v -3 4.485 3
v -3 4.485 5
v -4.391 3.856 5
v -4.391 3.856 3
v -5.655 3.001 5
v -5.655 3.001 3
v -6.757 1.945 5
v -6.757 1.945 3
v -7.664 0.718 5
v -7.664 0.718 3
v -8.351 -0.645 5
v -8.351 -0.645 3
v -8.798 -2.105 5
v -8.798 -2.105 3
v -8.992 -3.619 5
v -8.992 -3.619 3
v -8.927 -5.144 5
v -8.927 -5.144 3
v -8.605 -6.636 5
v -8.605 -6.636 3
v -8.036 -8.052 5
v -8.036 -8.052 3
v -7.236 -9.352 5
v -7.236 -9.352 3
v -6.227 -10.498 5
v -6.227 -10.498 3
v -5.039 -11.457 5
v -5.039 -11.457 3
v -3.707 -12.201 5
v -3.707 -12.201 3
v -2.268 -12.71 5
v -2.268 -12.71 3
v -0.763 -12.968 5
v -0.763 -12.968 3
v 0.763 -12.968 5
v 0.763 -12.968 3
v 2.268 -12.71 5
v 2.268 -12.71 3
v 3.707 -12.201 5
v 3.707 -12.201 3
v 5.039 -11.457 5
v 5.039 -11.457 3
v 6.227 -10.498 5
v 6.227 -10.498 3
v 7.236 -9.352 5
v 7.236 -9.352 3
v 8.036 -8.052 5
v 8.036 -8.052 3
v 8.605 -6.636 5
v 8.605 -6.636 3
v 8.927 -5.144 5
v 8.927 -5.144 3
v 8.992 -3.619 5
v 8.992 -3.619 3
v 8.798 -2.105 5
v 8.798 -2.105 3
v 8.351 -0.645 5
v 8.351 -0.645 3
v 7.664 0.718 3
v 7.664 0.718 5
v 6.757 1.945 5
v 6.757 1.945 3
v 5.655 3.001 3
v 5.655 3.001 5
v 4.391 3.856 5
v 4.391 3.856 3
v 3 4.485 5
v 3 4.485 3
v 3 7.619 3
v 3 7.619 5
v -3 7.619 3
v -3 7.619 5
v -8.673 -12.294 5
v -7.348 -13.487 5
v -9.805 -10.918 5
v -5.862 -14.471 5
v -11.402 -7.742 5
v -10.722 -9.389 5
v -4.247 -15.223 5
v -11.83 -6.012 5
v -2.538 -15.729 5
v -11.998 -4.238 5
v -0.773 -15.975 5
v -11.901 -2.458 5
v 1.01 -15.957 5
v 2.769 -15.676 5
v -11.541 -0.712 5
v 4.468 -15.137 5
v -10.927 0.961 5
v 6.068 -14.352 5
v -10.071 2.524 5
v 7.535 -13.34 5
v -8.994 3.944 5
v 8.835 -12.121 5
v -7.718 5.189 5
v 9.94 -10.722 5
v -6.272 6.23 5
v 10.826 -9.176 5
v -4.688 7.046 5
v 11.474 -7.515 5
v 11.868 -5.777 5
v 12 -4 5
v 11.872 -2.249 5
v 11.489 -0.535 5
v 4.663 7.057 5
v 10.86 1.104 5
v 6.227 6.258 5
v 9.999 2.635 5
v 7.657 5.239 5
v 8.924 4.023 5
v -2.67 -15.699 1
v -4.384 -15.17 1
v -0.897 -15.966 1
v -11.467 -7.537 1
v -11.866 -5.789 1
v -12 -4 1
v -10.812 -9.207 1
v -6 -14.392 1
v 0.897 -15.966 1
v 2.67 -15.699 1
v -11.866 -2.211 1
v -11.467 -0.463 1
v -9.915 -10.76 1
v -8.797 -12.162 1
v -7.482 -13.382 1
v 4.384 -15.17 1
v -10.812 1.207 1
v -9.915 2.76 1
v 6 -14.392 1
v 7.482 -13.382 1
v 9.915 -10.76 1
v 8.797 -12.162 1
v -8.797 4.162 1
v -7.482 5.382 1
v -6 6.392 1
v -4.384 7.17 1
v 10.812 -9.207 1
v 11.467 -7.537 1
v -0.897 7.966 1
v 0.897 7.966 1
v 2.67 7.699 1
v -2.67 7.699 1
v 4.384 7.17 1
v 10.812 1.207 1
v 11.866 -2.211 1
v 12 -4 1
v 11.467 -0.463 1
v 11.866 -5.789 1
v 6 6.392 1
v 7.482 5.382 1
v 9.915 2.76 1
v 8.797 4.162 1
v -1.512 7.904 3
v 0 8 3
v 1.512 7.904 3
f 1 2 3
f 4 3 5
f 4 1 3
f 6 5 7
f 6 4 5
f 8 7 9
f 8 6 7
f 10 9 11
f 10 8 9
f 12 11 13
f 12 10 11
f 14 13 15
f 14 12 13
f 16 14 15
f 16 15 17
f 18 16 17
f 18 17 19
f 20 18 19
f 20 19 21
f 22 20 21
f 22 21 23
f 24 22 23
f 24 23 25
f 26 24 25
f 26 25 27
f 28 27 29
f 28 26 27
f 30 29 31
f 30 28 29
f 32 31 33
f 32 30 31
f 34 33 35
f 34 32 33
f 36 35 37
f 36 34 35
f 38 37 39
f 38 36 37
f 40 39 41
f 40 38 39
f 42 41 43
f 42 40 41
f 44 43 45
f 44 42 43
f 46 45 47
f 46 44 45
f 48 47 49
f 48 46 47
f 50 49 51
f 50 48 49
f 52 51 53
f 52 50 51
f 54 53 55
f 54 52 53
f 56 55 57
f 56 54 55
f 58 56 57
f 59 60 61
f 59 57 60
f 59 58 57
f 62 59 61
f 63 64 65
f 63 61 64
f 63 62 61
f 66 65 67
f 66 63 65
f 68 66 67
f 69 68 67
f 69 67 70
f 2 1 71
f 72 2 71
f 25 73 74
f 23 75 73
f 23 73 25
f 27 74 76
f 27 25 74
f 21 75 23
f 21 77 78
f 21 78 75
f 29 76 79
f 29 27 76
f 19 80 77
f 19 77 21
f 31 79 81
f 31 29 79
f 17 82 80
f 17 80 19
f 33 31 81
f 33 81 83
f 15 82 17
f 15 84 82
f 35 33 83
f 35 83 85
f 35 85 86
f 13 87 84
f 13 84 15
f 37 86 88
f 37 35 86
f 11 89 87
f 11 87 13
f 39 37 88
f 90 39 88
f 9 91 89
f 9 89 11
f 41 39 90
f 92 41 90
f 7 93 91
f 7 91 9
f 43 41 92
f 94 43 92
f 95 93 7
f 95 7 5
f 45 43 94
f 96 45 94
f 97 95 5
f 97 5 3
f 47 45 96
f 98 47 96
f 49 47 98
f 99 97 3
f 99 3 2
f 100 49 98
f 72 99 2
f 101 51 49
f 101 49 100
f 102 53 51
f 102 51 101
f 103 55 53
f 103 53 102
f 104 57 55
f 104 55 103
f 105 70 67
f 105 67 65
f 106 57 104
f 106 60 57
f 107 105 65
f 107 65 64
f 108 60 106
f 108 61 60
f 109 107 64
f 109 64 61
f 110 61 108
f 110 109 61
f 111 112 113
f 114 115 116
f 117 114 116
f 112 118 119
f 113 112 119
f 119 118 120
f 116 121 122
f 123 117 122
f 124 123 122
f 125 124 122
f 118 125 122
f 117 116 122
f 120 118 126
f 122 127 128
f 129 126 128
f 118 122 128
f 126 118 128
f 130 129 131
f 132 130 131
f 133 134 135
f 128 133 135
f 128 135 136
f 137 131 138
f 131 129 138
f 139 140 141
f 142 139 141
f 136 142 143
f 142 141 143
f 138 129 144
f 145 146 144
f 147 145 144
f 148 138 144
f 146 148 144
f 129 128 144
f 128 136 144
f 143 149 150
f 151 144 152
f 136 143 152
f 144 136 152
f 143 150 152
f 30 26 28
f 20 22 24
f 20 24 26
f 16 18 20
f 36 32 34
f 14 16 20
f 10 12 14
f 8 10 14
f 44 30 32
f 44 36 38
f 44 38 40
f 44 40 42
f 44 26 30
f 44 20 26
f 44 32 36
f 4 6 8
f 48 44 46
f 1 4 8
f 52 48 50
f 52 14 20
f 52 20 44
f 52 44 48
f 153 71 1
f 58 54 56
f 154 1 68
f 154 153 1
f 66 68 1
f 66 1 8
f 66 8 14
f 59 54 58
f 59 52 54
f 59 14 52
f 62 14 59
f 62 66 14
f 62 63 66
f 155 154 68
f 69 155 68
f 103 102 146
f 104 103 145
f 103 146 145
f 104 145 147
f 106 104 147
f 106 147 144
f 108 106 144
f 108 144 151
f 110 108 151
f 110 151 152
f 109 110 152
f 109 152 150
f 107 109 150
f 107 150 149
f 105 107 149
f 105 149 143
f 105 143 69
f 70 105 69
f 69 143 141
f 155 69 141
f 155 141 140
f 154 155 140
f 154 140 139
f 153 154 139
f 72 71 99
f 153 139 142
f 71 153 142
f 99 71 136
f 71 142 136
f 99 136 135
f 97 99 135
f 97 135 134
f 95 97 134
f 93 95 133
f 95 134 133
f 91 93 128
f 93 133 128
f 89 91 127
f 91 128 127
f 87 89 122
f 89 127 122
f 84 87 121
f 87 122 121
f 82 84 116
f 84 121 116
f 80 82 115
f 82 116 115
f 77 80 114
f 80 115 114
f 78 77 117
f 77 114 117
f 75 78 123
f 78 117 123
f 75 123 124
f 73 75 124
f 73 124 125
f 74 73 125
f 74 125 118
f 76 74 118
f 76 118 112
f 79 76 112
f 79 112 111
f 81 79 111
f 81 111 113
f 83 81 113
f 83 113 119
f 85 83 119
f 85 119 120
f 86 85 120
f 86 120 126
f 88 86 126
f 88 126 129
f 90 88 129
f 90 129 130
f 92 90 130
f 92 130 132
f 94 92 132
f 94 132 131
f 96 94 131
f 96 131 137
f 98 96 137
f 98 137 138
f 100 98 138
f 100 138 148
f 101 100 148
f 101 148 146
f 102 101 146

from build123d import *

# Parameters (mm, degrees)
BOX_W             = 6
BOX_H             = 19
BOX_DEPTH         = 10
CYLINDER001_R     = 9
CYLINDER001_DEPTH = 10
CYLINDER_R        = 12
CYLINDER_DEPTH    = 4


with BuildPart() as cubo:
    # Box → Box (new body)
    with BuildSketch(Plane(origin=(-3, -4, 3), x_dir=(1, 0, 0), z_dir=(0, 0, 1))):
        with Locations((3, 9.5)):
            Rectangle(BOX_W, BOX_H)
    extrude(amount=BOX_DEPTH)


with BuildPart() as circ_int:
    # Cylinder001 → Cylinder001 (new body)
    with BuildSketch(Plane(origin=(0, -4, 3), x_dir=(1, 0, 0), z_dir=(0, 0, 1))):
        Circle(CYLINDER001_R)
    extrude(amount=CYLINDER001_DEPTH)


with BuildPart() as cut002:
    # Cylinder → Cylinder (new body)
    with BuildSketch(Plane(origin=(0, -4, 1), x_dir=(1, 0, 0), z_dir=(0, 0, 1))):
        Circle(CYLINDER_R)
    extrude(amount=CYLINDER_DEPTH)

    # Cut001: cut circ-int
    add(circ_int.part, mode=Mode.SUBTRACT)

    # Cut002: cut Cubo
    add(cubo.part, mode=Mode.SUBTRACT)


solid = cut002.part
